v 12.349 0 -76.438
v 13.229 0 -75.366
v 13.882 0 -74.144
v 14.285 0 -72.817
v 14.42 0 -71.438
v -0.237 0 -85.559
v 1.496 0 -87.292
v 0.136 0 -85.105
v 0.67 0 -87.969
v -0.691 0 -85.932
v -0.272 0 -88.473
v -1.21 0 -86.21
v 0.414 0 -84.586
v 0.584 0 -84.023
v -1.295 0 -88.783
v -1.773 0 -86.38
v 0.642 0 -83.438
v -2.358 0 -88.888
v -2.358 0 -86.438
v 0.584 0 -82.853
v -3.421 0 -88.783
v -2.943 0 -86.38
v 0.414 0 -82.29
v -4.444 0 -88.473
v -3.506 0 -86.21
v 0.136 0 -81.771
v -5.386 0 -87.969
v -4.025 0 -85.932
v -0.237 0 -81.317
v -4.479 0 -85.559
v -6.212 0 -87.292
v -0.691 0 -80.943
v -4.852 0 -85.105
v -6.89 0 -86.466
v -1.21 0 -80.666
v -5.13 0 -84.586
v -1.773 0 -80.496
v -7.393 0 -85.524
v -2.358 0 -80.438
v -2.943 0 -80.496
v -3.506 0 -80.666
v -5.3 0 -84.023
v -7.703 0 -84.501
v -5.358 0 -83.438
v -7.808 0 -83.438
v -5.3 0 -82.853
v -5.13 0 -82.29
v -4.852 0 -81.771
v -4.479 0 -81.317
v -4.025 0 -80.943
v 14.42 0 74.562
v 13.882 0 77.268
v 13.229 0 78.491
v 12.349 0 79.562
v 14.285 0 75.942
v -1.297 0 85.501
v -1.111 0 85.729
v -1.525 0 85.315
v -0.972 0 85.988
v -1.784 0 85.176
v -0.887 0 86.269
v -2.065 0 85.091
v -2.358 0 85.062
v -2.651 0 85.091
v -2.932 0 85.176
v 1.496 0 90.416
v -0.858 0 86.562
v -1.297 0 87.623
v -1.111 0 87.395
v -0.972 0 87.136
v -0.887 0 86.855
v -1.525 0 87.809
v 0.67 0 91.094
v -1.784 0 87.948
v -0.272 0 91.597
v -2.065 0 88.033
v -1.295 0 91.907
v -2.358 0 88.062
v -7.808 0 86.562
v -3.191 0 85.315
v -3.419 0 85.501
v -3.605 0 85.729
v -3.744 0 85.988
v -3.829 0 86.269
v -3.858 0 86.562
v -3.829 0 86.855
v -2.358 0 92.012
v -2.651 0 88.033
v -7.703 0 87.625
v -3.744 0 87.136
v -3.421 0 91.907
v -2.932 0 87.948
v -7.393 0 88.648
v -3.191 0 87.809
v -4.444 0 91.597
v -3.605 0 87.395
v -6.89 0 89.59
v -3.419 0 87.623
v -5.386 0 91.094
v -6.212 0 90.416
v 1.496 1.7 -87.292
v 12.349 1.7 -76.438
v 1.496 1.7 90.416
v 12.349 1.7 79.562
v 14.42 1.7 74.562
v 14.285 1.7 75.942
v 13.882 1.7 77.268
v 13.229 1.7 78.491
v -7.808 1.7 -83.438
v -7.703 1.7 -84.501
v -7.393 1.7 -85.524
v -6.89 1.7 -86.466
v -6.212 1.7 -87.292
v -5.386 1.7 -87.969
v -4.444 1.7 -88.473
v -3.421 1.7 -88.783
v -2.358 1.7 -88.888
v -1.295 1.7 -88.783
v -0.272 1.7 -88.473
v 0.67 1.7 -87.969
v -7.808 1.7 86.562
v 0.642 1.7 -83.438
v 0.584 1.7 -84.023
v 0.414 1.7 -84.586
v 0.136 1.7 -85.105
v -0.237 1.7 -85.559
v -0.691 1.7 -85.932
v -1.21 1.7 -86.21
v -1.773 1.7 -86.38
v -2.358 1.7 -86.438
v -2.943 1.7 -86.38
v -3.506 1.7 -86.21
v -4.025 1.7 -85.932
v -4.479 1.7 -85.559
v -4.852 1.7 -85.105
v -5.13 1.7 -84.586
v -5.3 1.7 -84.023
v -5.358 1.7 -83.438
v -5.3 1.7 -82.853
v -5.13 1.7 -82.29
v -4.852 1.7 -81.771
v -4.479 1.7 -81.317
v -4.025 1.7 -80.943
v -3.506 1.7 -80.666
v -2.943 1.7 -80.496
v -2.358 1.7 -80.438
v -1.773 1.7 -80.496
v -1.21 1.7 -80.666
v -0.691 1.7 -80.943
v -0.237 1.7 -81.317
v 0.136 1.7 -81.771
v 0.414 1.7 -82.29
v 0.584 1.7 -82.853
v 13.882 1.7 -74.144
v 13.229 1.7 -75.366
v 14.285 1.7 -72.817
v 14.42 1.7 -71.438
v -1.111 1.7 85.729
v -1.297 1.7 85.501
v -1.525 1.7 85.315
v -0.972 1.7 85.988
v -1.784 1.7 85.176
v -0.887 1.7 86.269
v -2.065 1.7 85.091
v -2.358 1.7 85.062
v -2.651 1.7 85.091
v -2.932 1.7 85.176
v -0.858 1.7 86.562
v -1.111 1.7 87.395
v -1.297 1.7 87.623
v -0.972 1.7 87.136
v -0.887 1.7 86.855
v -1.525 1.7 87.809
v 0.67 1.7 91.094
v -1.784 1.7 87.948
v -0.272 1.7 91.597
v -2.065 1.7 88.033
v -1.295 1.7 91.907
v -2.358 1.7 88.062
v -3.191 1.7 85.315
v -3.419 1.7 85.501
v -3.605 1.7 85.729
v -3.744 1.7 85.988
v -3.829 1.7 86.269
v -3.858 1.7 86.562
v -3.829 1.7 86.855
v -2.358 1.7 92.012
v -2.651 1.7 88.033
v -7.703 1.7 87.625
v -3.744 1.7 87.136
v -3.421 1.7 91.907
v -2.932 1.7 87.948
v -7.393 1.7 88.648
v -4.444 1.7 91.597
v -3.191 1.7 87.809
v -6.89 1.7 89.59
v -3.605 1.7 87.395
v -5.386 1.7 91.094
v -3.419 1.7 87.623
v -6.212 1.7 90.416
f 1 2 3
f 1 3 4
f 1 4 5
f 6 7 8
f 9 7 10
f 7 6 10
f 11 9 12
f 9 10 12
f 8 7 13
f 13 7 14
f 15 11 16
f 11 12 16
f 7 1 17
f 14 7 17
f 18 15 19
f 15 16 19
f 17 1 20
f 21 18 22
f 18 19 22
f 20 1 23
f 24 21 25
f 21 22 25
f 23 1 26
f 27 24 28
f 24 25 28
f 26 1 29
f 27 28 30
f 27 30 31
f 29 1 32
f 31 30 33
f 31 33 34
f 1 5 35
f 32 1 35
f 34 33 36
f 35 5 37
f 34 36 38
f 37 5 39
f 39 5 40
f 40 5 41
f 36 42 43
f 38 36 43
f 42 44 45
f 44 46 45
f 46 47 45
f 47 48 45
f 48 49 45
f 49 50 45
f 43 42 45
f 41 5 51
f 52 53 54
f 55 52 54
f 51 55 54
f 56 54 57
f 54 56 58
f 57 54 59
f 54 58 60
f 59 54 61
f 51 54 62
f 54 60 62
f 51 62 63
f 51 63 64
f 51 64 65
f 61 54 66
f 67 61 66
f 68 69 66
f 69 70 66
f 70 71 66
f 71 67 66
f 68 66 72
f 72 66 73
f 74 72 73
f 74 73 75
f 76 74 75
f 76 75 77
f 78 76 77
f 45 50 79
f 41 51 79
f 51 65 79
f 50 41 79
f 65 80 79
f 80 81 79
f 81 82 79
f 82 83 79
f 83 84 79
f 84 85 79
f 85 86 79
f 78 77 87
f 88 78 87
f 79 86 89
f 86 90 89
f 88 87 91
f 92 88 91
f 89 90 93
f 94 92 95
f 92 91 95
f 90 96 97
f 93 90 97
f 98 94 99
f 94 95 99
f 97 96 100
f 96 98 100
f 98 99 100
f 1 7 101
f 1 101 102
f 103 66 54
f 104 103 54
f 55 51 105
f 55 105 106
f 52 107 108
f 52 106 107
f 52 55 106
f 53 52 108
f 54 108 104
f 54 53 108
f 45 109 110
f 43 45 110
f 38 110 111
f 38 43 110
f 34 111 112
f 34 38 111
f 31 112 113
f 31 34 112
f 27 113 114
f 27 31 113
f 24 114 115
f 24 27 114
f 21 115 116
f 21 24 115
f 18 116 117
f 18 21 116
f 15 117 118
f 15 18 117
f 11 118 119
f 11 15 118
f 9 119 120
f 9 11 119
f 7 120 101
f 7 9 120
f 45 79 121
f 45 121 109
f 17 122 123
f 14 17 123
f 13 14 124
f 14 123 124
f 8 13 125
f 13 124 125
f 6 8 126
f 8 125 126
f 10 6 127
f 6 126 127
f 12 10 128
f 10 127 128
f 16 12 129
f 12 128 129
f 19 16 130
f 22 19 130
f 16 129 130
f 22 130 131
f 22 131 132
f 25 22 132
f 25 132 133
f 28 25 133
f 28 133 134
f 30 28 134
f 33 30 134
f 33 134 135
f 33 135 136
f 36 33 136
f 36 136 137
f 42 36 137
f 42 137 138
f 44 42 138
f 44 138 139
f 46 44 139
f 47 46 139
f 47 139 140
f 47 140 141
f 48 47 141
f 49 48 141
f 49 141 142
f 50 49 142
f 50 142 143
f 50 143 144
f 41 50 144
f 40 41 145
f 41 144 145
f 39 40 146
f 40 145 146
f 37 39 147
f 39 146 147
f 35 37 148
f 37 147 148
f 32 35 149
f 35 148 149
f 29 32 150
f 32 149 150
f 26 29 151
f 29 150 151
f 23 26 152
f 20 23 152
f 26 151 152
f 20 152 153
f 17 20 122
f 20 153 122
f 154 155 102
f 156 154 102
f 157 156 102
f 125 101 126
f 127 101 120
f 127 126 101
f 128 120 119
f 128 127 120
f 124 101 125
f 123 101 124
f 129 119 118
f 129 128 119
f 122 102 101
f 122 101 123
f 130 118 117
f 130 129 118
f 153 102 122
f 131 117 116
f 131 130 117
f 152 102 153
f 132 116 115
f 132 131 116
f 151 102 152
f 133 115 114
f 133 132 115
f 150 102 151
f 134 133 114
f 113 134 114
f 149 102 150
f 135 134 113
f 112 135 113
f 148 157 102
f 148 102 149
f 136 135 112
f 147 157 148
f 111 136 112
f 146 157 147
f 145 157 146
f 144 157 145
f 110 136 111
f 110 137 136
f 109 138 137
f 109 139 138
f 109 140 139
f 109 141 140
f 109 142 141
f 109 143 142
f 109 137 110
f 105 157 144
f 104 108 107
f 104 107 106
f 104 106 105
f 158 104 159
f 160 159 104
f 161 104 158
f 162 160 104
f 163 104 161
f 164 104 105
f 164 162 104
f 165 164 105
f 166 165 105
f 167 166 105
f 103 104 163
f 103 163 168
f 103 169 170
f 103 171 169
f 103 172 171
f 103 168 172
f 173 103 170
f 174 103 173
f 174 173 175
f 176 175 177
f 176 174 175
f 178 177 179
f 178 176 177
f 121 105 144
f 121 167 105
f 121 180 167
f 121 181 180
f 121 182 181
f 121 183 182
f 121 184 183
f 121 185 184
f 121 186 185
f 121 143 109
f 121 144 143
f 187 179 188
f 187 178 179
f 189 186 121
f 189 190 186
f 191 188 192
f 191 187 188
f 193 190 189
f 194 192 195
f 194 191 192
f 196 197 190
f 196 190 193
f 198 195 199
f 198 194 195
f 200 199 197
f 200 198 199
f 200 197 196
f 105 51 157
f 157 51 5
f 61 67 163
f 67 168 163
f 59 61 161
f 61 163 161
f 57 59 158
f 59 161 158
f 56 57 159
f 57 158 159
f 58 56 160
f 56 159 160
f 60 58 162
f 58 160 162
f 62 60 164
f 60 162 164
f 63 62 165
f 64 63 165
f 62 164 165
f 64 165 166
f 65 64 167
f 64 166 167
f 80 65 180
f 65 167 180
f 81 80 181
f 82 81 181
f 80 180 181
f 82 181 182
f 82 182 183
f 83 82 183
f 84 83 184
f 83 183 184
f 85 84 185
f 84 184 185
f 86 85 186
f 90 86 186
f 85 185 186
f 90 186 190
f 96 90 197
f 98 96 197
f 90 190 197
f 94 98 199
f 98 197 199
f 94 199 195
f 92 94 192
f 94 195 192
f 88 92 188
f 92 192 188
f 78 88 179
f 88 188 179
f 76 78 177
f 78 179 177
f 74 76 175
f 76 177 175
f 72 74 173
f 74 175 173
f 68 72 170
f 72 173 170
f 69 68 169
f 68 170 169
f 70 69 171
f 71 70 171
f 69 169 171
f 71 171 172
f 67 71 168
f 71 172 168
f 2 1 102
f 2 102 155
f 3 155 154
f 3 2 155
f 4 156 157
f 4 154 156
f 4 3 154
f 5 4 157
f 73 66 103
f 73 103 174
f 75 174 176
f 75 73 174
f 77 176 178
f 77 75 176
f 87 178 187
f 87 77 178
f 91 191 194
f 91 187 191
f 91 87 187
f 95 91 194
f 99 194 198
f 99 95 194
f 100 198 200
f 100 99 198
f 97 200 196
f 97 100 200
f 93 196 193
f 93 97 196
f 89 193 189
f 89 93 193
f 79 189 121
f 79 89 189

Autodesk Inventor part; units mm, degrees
ref_plane "YZ Plane" through (0, 0, 0) normal (1, 0, 0) x (0, 1, 0)
ref_plane "XZ Plane" through (0, 0, 0) normal (0, 1, 0) x (-1, 0, 0)
ref_plane "XY Plane" through (0, 0, 0) normal (0, 0, 1) x (1, 0, 0)
sketch "Sketch1" plane through (0, 0, 0) normal (0, 1, 0) x (-1, 0, 0)
  arc A0 (7.808, 86.5621) -> (-1.4957, 90.4158) centre (2.358, 86.5621) ccw
  line L0 (7.808, 86.5621) -> (7.808, -83.4379)
  line L1 (-1.4957, 90.4158) -> (-12.3494, 79.5621)
  arc A1 (-12.3494, 79.5621) -> (-14.4205, 74.5621) centre (-7.3494, 74.5621) ccw
  line L2 (-14.4205, 74.5621) -> (-14.4205, -71.4379)
  arc A2 (-1.4957, -87.2917) -> (7.808, -83.4379) centre (2.358, -83.4379) ccw
  line L3 (-1.4957, -87.2917) -> (-12.3494, -76.4379)
  arc A3 (-14.4205, -71.4379) -> (-12.3494, -76.4379) centre (-7.3494, -71.4379) ccw
  point P0 (0, 0)
  dimension "d0" = 10.9
  dimension "d1" = 170
  dimension "d2" = 0
  dimension "d3" = 12
  dimension "d4" = 12
  dimension "d5" = 5.45
  dimension "d6" = 45
  dimension "d7" = 7
  dimension "d8" = 7
  dimension "d9" = 10.9
  dimension "d10" = 135
extrude "Extrusion1" add sketch "Sketch1" along normal blind 1.7
sketch "Sketch2" plane through (0, 1.7, 0) normal (0, 1, 0) x (1, 0, 0)
  arc A0 (1.4957, 87.2917) -> (-7.808, 83.4379) centre (-2.358, 83.4379) ccw projected
  arc A1 (-7.808, -86.5621) -> (1.4957, -90.4158) centre (-2.358, -86.5621) ccw projected
  circle A2 centre (-2.358, 83.4379) radius 3
  circle A3 centre (-2.358, -86.5621) radius 1.5
  point P0 (0, 0)
  dimension "d13" = 6
  dimension "d14" = 3
extrude "Extrusion2" cut sketch "Sketch2" against normal through all
properties part number "A2P4"
